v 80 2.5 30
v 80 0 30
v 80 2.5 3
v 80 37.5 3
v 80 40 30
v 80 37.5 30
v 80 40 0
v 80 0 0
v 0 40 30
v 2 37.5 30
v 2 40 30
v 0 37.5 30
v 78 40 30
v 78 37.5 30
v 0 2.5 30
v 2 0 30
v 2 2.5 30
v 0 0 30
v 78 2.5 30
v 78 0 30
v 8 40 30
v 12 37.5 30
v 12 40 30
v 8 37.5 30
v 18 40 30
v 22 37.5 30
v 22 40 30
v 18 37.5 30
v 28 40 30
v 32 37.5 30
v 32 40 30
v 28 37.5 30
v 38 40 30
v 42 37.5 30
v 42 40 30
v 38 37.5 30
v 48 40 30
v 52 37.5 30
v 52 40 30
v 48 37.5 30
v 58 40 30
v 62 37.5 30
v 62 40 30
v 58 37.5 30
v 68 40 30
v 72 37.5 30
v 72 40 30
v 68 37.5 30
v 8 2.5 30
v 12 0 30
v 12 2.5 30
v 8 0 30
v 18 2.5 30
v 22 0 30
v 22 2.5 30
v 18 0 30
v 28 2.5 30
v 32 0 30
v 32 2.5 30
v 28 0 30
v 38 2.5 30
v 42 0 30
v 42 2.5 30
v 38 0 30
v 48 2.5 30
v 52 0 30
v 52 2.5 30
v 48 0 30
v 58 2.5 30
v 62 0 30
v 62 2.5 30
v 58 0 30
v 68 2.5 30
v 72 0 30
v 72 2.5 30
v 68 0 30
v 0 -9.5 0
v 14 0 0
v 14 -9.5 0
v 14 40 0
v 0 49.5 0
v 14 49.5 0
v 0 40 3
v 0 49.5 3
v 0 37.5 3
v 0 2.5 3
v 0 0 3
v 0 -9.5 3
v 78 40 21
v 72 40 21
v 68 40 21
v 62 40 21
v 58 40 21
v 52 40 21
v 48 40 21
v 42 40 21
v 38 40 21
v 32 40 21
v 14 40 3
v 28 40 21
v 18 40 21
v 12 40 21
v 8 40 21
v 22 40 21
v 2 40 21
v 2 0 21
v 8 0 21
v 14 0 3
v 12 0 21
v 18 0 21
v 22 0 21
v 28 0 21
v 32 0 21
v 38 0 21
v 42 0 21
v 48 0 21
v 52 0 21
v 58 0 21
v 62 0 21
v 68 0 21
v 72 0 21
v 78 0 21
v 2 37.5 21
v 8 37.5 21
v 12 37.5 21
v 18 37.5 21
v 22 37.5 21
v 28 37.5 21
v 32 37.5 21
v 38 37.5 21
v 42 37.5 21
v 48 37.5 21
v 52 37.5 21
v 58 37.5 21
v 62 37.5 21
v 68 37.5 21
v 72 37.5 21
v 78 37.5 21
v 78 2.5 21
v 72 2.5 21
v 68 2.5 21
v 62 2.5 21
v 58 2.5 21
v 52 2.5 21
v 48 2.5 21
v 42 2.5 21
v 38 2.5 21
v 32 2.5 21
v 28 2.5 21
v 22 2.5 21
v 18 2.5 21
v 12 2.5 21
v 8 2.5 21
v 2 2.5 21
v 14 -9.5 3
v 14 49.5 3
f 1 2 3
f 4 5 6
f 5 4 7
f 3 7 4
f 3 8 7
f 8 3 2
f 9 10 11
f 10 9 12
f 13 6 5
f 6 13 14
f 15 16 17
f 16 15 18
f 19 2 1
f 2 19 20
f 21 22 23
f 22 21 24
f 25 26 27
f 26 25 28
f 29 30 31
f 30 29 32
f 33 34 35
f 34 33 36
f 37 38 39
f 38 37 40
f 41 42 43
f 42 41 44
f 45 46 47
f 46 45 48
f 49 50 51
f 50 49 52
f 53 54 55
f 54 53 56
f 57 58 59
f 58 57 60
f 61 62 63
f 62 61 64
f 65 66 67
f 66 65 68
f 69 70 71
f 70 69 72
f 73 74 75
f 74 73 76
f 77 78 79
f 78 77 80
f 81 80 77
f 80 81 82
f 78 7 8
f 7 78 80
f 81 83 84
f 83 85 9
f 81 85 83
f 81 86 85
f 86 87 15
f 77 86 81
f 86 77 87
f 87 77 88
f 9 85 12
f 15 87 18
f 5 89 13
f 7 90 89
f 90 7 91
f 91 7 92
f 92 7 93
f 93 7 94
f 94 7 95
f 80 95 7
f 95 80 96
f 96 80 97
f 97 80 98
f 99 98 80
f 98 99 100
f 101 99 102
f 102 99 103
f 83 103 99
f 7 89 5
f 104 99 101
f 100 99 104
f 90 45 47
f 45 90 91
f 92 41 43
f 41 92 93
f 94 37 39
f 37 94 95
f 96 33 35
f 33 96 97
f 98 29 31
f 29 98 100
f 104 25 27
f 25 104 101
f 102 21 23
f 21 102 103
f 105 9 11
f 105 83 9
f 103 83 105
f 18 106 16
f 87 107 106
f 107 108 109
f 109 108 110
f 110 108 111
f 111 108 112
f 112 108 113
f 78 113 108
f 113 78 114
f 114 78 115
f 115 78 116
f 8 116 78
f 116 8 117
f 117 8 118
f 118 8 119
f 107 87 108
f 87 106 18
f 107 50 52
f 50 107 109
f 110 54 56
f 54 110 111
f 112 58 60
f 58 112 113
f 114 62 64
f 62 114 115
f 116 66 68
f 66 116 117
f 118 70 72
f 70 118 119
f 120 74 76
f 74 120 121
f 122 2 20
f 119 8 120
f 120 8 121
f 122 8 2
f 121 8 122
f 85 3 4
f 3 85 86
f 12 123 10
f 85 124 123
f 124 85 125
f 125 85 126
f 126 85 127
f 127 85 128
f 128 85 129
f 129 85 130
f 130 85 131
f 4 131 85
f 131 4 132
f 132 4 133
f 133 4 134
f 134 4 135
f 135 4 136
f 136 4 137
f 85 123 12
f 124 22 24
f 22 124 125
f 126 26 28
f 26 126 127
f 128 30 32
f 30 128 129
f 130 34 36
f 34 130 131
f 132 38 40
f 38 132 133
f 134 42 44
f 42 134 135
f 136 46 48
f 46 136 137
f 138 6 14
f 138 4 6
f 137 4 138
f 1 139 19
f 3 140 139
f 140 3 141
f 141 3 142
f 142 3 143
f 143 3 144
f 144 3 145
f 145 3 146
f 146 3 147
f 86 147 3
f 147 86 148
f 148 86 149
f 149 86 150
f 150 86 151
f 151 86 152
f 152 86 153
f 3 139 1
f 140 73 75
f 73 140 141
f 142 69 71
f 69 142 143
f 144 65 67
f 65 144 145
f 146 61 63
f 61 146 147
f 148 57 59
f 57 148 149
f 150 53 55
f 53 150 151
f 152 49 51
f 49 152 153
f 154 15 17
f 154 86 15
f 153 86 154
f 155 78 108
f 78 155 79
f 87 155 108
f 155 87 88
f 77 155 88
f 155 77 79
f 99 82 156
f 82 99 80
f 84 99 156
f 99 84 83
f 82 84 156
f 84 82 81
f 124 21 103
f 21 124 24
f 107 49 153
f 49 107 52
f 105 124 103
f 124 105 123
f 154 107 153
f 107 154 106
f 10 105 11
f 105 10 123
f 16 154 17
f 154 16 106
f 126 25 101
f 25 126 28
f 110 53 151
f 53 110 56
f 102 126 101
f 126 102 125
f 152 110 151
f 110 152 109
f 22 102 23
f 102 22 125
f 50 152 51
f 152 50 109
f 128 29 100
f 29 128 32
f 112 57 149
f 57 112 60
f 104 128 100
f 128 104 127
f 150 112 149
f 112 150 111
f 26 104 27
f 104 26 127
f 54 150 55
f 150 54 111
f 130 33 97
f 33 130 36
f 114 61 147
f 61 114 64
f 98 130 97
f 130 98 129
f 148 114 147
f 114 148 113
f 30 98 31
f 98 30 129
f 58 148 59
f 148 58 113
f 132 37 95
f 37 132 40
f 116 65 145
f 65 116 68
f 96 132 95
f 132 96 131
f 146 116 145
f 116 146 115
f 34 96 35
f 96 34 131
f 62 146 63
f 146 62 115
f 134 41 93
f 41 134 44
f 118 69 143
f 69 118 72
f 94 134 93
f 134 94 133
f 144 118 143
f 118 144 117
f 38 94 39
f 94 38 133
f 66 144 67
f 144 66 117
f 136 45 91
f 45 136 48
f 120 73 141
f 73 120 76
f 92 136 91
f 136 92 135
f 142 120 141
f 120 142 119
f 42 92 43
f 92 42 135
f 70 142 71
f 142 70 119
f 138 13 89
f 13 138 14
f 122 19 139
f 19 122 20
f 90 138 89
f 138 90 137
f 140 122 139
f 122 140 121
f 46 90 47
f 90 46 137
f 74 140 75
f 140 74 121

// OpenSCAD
$fn = 32;

// ----------------------------------------------------------------------
// Cable duct: 80 x 40 x 30 mm, 8 fingers
// ----------------------------------------------------------------------

// --- parameters (mm) ---
channel_l = 80;           // duct length, X
channel_w = 40;           // duct width, Y
channel_h = 30;           // duct height, Z
channel_t = 2.5;          // side wall thickness
floor_t = 3;              // floor thickness
slot_w = 6;               // finger slot width
slot_h = 18;              // finger slot height
fingers = 8;              // number of finger slots per side
pitch = 10;               // finger pitch
ear_w = 10.5;             // mounting ear width
ear_l = 14;               // mounting ear length

module shell() {
  difference() {
    cube([channel_l, channel_w, channel_h]);
    /* open top channel */
    translate([-channel_t - 1, channel_t, floor_t])
      cube([channel_l + 2 * channel_t + 2, channel_w - 2 * channel_t, channel_h + 1]);
  }
}

module ears() {
  translate([0, -ear_w + 1, 0]) cube([ear_l, ear_w, floor_t]);
  translate([0, channel_w - 1, 0]) cube([ear_l, ear_w, floor_t]);
}

difference() {
  union() {
    shell();
    ears();
  }
  /* finger slots cut through both side walls */
  for (i = [0 : fingers - 1]) translate([pitch / 2 + i * pitch - slot_w / 2, -1, floor_t + slot_h]) cube([slot_w, channel_w + 2, channel_h]);
}
